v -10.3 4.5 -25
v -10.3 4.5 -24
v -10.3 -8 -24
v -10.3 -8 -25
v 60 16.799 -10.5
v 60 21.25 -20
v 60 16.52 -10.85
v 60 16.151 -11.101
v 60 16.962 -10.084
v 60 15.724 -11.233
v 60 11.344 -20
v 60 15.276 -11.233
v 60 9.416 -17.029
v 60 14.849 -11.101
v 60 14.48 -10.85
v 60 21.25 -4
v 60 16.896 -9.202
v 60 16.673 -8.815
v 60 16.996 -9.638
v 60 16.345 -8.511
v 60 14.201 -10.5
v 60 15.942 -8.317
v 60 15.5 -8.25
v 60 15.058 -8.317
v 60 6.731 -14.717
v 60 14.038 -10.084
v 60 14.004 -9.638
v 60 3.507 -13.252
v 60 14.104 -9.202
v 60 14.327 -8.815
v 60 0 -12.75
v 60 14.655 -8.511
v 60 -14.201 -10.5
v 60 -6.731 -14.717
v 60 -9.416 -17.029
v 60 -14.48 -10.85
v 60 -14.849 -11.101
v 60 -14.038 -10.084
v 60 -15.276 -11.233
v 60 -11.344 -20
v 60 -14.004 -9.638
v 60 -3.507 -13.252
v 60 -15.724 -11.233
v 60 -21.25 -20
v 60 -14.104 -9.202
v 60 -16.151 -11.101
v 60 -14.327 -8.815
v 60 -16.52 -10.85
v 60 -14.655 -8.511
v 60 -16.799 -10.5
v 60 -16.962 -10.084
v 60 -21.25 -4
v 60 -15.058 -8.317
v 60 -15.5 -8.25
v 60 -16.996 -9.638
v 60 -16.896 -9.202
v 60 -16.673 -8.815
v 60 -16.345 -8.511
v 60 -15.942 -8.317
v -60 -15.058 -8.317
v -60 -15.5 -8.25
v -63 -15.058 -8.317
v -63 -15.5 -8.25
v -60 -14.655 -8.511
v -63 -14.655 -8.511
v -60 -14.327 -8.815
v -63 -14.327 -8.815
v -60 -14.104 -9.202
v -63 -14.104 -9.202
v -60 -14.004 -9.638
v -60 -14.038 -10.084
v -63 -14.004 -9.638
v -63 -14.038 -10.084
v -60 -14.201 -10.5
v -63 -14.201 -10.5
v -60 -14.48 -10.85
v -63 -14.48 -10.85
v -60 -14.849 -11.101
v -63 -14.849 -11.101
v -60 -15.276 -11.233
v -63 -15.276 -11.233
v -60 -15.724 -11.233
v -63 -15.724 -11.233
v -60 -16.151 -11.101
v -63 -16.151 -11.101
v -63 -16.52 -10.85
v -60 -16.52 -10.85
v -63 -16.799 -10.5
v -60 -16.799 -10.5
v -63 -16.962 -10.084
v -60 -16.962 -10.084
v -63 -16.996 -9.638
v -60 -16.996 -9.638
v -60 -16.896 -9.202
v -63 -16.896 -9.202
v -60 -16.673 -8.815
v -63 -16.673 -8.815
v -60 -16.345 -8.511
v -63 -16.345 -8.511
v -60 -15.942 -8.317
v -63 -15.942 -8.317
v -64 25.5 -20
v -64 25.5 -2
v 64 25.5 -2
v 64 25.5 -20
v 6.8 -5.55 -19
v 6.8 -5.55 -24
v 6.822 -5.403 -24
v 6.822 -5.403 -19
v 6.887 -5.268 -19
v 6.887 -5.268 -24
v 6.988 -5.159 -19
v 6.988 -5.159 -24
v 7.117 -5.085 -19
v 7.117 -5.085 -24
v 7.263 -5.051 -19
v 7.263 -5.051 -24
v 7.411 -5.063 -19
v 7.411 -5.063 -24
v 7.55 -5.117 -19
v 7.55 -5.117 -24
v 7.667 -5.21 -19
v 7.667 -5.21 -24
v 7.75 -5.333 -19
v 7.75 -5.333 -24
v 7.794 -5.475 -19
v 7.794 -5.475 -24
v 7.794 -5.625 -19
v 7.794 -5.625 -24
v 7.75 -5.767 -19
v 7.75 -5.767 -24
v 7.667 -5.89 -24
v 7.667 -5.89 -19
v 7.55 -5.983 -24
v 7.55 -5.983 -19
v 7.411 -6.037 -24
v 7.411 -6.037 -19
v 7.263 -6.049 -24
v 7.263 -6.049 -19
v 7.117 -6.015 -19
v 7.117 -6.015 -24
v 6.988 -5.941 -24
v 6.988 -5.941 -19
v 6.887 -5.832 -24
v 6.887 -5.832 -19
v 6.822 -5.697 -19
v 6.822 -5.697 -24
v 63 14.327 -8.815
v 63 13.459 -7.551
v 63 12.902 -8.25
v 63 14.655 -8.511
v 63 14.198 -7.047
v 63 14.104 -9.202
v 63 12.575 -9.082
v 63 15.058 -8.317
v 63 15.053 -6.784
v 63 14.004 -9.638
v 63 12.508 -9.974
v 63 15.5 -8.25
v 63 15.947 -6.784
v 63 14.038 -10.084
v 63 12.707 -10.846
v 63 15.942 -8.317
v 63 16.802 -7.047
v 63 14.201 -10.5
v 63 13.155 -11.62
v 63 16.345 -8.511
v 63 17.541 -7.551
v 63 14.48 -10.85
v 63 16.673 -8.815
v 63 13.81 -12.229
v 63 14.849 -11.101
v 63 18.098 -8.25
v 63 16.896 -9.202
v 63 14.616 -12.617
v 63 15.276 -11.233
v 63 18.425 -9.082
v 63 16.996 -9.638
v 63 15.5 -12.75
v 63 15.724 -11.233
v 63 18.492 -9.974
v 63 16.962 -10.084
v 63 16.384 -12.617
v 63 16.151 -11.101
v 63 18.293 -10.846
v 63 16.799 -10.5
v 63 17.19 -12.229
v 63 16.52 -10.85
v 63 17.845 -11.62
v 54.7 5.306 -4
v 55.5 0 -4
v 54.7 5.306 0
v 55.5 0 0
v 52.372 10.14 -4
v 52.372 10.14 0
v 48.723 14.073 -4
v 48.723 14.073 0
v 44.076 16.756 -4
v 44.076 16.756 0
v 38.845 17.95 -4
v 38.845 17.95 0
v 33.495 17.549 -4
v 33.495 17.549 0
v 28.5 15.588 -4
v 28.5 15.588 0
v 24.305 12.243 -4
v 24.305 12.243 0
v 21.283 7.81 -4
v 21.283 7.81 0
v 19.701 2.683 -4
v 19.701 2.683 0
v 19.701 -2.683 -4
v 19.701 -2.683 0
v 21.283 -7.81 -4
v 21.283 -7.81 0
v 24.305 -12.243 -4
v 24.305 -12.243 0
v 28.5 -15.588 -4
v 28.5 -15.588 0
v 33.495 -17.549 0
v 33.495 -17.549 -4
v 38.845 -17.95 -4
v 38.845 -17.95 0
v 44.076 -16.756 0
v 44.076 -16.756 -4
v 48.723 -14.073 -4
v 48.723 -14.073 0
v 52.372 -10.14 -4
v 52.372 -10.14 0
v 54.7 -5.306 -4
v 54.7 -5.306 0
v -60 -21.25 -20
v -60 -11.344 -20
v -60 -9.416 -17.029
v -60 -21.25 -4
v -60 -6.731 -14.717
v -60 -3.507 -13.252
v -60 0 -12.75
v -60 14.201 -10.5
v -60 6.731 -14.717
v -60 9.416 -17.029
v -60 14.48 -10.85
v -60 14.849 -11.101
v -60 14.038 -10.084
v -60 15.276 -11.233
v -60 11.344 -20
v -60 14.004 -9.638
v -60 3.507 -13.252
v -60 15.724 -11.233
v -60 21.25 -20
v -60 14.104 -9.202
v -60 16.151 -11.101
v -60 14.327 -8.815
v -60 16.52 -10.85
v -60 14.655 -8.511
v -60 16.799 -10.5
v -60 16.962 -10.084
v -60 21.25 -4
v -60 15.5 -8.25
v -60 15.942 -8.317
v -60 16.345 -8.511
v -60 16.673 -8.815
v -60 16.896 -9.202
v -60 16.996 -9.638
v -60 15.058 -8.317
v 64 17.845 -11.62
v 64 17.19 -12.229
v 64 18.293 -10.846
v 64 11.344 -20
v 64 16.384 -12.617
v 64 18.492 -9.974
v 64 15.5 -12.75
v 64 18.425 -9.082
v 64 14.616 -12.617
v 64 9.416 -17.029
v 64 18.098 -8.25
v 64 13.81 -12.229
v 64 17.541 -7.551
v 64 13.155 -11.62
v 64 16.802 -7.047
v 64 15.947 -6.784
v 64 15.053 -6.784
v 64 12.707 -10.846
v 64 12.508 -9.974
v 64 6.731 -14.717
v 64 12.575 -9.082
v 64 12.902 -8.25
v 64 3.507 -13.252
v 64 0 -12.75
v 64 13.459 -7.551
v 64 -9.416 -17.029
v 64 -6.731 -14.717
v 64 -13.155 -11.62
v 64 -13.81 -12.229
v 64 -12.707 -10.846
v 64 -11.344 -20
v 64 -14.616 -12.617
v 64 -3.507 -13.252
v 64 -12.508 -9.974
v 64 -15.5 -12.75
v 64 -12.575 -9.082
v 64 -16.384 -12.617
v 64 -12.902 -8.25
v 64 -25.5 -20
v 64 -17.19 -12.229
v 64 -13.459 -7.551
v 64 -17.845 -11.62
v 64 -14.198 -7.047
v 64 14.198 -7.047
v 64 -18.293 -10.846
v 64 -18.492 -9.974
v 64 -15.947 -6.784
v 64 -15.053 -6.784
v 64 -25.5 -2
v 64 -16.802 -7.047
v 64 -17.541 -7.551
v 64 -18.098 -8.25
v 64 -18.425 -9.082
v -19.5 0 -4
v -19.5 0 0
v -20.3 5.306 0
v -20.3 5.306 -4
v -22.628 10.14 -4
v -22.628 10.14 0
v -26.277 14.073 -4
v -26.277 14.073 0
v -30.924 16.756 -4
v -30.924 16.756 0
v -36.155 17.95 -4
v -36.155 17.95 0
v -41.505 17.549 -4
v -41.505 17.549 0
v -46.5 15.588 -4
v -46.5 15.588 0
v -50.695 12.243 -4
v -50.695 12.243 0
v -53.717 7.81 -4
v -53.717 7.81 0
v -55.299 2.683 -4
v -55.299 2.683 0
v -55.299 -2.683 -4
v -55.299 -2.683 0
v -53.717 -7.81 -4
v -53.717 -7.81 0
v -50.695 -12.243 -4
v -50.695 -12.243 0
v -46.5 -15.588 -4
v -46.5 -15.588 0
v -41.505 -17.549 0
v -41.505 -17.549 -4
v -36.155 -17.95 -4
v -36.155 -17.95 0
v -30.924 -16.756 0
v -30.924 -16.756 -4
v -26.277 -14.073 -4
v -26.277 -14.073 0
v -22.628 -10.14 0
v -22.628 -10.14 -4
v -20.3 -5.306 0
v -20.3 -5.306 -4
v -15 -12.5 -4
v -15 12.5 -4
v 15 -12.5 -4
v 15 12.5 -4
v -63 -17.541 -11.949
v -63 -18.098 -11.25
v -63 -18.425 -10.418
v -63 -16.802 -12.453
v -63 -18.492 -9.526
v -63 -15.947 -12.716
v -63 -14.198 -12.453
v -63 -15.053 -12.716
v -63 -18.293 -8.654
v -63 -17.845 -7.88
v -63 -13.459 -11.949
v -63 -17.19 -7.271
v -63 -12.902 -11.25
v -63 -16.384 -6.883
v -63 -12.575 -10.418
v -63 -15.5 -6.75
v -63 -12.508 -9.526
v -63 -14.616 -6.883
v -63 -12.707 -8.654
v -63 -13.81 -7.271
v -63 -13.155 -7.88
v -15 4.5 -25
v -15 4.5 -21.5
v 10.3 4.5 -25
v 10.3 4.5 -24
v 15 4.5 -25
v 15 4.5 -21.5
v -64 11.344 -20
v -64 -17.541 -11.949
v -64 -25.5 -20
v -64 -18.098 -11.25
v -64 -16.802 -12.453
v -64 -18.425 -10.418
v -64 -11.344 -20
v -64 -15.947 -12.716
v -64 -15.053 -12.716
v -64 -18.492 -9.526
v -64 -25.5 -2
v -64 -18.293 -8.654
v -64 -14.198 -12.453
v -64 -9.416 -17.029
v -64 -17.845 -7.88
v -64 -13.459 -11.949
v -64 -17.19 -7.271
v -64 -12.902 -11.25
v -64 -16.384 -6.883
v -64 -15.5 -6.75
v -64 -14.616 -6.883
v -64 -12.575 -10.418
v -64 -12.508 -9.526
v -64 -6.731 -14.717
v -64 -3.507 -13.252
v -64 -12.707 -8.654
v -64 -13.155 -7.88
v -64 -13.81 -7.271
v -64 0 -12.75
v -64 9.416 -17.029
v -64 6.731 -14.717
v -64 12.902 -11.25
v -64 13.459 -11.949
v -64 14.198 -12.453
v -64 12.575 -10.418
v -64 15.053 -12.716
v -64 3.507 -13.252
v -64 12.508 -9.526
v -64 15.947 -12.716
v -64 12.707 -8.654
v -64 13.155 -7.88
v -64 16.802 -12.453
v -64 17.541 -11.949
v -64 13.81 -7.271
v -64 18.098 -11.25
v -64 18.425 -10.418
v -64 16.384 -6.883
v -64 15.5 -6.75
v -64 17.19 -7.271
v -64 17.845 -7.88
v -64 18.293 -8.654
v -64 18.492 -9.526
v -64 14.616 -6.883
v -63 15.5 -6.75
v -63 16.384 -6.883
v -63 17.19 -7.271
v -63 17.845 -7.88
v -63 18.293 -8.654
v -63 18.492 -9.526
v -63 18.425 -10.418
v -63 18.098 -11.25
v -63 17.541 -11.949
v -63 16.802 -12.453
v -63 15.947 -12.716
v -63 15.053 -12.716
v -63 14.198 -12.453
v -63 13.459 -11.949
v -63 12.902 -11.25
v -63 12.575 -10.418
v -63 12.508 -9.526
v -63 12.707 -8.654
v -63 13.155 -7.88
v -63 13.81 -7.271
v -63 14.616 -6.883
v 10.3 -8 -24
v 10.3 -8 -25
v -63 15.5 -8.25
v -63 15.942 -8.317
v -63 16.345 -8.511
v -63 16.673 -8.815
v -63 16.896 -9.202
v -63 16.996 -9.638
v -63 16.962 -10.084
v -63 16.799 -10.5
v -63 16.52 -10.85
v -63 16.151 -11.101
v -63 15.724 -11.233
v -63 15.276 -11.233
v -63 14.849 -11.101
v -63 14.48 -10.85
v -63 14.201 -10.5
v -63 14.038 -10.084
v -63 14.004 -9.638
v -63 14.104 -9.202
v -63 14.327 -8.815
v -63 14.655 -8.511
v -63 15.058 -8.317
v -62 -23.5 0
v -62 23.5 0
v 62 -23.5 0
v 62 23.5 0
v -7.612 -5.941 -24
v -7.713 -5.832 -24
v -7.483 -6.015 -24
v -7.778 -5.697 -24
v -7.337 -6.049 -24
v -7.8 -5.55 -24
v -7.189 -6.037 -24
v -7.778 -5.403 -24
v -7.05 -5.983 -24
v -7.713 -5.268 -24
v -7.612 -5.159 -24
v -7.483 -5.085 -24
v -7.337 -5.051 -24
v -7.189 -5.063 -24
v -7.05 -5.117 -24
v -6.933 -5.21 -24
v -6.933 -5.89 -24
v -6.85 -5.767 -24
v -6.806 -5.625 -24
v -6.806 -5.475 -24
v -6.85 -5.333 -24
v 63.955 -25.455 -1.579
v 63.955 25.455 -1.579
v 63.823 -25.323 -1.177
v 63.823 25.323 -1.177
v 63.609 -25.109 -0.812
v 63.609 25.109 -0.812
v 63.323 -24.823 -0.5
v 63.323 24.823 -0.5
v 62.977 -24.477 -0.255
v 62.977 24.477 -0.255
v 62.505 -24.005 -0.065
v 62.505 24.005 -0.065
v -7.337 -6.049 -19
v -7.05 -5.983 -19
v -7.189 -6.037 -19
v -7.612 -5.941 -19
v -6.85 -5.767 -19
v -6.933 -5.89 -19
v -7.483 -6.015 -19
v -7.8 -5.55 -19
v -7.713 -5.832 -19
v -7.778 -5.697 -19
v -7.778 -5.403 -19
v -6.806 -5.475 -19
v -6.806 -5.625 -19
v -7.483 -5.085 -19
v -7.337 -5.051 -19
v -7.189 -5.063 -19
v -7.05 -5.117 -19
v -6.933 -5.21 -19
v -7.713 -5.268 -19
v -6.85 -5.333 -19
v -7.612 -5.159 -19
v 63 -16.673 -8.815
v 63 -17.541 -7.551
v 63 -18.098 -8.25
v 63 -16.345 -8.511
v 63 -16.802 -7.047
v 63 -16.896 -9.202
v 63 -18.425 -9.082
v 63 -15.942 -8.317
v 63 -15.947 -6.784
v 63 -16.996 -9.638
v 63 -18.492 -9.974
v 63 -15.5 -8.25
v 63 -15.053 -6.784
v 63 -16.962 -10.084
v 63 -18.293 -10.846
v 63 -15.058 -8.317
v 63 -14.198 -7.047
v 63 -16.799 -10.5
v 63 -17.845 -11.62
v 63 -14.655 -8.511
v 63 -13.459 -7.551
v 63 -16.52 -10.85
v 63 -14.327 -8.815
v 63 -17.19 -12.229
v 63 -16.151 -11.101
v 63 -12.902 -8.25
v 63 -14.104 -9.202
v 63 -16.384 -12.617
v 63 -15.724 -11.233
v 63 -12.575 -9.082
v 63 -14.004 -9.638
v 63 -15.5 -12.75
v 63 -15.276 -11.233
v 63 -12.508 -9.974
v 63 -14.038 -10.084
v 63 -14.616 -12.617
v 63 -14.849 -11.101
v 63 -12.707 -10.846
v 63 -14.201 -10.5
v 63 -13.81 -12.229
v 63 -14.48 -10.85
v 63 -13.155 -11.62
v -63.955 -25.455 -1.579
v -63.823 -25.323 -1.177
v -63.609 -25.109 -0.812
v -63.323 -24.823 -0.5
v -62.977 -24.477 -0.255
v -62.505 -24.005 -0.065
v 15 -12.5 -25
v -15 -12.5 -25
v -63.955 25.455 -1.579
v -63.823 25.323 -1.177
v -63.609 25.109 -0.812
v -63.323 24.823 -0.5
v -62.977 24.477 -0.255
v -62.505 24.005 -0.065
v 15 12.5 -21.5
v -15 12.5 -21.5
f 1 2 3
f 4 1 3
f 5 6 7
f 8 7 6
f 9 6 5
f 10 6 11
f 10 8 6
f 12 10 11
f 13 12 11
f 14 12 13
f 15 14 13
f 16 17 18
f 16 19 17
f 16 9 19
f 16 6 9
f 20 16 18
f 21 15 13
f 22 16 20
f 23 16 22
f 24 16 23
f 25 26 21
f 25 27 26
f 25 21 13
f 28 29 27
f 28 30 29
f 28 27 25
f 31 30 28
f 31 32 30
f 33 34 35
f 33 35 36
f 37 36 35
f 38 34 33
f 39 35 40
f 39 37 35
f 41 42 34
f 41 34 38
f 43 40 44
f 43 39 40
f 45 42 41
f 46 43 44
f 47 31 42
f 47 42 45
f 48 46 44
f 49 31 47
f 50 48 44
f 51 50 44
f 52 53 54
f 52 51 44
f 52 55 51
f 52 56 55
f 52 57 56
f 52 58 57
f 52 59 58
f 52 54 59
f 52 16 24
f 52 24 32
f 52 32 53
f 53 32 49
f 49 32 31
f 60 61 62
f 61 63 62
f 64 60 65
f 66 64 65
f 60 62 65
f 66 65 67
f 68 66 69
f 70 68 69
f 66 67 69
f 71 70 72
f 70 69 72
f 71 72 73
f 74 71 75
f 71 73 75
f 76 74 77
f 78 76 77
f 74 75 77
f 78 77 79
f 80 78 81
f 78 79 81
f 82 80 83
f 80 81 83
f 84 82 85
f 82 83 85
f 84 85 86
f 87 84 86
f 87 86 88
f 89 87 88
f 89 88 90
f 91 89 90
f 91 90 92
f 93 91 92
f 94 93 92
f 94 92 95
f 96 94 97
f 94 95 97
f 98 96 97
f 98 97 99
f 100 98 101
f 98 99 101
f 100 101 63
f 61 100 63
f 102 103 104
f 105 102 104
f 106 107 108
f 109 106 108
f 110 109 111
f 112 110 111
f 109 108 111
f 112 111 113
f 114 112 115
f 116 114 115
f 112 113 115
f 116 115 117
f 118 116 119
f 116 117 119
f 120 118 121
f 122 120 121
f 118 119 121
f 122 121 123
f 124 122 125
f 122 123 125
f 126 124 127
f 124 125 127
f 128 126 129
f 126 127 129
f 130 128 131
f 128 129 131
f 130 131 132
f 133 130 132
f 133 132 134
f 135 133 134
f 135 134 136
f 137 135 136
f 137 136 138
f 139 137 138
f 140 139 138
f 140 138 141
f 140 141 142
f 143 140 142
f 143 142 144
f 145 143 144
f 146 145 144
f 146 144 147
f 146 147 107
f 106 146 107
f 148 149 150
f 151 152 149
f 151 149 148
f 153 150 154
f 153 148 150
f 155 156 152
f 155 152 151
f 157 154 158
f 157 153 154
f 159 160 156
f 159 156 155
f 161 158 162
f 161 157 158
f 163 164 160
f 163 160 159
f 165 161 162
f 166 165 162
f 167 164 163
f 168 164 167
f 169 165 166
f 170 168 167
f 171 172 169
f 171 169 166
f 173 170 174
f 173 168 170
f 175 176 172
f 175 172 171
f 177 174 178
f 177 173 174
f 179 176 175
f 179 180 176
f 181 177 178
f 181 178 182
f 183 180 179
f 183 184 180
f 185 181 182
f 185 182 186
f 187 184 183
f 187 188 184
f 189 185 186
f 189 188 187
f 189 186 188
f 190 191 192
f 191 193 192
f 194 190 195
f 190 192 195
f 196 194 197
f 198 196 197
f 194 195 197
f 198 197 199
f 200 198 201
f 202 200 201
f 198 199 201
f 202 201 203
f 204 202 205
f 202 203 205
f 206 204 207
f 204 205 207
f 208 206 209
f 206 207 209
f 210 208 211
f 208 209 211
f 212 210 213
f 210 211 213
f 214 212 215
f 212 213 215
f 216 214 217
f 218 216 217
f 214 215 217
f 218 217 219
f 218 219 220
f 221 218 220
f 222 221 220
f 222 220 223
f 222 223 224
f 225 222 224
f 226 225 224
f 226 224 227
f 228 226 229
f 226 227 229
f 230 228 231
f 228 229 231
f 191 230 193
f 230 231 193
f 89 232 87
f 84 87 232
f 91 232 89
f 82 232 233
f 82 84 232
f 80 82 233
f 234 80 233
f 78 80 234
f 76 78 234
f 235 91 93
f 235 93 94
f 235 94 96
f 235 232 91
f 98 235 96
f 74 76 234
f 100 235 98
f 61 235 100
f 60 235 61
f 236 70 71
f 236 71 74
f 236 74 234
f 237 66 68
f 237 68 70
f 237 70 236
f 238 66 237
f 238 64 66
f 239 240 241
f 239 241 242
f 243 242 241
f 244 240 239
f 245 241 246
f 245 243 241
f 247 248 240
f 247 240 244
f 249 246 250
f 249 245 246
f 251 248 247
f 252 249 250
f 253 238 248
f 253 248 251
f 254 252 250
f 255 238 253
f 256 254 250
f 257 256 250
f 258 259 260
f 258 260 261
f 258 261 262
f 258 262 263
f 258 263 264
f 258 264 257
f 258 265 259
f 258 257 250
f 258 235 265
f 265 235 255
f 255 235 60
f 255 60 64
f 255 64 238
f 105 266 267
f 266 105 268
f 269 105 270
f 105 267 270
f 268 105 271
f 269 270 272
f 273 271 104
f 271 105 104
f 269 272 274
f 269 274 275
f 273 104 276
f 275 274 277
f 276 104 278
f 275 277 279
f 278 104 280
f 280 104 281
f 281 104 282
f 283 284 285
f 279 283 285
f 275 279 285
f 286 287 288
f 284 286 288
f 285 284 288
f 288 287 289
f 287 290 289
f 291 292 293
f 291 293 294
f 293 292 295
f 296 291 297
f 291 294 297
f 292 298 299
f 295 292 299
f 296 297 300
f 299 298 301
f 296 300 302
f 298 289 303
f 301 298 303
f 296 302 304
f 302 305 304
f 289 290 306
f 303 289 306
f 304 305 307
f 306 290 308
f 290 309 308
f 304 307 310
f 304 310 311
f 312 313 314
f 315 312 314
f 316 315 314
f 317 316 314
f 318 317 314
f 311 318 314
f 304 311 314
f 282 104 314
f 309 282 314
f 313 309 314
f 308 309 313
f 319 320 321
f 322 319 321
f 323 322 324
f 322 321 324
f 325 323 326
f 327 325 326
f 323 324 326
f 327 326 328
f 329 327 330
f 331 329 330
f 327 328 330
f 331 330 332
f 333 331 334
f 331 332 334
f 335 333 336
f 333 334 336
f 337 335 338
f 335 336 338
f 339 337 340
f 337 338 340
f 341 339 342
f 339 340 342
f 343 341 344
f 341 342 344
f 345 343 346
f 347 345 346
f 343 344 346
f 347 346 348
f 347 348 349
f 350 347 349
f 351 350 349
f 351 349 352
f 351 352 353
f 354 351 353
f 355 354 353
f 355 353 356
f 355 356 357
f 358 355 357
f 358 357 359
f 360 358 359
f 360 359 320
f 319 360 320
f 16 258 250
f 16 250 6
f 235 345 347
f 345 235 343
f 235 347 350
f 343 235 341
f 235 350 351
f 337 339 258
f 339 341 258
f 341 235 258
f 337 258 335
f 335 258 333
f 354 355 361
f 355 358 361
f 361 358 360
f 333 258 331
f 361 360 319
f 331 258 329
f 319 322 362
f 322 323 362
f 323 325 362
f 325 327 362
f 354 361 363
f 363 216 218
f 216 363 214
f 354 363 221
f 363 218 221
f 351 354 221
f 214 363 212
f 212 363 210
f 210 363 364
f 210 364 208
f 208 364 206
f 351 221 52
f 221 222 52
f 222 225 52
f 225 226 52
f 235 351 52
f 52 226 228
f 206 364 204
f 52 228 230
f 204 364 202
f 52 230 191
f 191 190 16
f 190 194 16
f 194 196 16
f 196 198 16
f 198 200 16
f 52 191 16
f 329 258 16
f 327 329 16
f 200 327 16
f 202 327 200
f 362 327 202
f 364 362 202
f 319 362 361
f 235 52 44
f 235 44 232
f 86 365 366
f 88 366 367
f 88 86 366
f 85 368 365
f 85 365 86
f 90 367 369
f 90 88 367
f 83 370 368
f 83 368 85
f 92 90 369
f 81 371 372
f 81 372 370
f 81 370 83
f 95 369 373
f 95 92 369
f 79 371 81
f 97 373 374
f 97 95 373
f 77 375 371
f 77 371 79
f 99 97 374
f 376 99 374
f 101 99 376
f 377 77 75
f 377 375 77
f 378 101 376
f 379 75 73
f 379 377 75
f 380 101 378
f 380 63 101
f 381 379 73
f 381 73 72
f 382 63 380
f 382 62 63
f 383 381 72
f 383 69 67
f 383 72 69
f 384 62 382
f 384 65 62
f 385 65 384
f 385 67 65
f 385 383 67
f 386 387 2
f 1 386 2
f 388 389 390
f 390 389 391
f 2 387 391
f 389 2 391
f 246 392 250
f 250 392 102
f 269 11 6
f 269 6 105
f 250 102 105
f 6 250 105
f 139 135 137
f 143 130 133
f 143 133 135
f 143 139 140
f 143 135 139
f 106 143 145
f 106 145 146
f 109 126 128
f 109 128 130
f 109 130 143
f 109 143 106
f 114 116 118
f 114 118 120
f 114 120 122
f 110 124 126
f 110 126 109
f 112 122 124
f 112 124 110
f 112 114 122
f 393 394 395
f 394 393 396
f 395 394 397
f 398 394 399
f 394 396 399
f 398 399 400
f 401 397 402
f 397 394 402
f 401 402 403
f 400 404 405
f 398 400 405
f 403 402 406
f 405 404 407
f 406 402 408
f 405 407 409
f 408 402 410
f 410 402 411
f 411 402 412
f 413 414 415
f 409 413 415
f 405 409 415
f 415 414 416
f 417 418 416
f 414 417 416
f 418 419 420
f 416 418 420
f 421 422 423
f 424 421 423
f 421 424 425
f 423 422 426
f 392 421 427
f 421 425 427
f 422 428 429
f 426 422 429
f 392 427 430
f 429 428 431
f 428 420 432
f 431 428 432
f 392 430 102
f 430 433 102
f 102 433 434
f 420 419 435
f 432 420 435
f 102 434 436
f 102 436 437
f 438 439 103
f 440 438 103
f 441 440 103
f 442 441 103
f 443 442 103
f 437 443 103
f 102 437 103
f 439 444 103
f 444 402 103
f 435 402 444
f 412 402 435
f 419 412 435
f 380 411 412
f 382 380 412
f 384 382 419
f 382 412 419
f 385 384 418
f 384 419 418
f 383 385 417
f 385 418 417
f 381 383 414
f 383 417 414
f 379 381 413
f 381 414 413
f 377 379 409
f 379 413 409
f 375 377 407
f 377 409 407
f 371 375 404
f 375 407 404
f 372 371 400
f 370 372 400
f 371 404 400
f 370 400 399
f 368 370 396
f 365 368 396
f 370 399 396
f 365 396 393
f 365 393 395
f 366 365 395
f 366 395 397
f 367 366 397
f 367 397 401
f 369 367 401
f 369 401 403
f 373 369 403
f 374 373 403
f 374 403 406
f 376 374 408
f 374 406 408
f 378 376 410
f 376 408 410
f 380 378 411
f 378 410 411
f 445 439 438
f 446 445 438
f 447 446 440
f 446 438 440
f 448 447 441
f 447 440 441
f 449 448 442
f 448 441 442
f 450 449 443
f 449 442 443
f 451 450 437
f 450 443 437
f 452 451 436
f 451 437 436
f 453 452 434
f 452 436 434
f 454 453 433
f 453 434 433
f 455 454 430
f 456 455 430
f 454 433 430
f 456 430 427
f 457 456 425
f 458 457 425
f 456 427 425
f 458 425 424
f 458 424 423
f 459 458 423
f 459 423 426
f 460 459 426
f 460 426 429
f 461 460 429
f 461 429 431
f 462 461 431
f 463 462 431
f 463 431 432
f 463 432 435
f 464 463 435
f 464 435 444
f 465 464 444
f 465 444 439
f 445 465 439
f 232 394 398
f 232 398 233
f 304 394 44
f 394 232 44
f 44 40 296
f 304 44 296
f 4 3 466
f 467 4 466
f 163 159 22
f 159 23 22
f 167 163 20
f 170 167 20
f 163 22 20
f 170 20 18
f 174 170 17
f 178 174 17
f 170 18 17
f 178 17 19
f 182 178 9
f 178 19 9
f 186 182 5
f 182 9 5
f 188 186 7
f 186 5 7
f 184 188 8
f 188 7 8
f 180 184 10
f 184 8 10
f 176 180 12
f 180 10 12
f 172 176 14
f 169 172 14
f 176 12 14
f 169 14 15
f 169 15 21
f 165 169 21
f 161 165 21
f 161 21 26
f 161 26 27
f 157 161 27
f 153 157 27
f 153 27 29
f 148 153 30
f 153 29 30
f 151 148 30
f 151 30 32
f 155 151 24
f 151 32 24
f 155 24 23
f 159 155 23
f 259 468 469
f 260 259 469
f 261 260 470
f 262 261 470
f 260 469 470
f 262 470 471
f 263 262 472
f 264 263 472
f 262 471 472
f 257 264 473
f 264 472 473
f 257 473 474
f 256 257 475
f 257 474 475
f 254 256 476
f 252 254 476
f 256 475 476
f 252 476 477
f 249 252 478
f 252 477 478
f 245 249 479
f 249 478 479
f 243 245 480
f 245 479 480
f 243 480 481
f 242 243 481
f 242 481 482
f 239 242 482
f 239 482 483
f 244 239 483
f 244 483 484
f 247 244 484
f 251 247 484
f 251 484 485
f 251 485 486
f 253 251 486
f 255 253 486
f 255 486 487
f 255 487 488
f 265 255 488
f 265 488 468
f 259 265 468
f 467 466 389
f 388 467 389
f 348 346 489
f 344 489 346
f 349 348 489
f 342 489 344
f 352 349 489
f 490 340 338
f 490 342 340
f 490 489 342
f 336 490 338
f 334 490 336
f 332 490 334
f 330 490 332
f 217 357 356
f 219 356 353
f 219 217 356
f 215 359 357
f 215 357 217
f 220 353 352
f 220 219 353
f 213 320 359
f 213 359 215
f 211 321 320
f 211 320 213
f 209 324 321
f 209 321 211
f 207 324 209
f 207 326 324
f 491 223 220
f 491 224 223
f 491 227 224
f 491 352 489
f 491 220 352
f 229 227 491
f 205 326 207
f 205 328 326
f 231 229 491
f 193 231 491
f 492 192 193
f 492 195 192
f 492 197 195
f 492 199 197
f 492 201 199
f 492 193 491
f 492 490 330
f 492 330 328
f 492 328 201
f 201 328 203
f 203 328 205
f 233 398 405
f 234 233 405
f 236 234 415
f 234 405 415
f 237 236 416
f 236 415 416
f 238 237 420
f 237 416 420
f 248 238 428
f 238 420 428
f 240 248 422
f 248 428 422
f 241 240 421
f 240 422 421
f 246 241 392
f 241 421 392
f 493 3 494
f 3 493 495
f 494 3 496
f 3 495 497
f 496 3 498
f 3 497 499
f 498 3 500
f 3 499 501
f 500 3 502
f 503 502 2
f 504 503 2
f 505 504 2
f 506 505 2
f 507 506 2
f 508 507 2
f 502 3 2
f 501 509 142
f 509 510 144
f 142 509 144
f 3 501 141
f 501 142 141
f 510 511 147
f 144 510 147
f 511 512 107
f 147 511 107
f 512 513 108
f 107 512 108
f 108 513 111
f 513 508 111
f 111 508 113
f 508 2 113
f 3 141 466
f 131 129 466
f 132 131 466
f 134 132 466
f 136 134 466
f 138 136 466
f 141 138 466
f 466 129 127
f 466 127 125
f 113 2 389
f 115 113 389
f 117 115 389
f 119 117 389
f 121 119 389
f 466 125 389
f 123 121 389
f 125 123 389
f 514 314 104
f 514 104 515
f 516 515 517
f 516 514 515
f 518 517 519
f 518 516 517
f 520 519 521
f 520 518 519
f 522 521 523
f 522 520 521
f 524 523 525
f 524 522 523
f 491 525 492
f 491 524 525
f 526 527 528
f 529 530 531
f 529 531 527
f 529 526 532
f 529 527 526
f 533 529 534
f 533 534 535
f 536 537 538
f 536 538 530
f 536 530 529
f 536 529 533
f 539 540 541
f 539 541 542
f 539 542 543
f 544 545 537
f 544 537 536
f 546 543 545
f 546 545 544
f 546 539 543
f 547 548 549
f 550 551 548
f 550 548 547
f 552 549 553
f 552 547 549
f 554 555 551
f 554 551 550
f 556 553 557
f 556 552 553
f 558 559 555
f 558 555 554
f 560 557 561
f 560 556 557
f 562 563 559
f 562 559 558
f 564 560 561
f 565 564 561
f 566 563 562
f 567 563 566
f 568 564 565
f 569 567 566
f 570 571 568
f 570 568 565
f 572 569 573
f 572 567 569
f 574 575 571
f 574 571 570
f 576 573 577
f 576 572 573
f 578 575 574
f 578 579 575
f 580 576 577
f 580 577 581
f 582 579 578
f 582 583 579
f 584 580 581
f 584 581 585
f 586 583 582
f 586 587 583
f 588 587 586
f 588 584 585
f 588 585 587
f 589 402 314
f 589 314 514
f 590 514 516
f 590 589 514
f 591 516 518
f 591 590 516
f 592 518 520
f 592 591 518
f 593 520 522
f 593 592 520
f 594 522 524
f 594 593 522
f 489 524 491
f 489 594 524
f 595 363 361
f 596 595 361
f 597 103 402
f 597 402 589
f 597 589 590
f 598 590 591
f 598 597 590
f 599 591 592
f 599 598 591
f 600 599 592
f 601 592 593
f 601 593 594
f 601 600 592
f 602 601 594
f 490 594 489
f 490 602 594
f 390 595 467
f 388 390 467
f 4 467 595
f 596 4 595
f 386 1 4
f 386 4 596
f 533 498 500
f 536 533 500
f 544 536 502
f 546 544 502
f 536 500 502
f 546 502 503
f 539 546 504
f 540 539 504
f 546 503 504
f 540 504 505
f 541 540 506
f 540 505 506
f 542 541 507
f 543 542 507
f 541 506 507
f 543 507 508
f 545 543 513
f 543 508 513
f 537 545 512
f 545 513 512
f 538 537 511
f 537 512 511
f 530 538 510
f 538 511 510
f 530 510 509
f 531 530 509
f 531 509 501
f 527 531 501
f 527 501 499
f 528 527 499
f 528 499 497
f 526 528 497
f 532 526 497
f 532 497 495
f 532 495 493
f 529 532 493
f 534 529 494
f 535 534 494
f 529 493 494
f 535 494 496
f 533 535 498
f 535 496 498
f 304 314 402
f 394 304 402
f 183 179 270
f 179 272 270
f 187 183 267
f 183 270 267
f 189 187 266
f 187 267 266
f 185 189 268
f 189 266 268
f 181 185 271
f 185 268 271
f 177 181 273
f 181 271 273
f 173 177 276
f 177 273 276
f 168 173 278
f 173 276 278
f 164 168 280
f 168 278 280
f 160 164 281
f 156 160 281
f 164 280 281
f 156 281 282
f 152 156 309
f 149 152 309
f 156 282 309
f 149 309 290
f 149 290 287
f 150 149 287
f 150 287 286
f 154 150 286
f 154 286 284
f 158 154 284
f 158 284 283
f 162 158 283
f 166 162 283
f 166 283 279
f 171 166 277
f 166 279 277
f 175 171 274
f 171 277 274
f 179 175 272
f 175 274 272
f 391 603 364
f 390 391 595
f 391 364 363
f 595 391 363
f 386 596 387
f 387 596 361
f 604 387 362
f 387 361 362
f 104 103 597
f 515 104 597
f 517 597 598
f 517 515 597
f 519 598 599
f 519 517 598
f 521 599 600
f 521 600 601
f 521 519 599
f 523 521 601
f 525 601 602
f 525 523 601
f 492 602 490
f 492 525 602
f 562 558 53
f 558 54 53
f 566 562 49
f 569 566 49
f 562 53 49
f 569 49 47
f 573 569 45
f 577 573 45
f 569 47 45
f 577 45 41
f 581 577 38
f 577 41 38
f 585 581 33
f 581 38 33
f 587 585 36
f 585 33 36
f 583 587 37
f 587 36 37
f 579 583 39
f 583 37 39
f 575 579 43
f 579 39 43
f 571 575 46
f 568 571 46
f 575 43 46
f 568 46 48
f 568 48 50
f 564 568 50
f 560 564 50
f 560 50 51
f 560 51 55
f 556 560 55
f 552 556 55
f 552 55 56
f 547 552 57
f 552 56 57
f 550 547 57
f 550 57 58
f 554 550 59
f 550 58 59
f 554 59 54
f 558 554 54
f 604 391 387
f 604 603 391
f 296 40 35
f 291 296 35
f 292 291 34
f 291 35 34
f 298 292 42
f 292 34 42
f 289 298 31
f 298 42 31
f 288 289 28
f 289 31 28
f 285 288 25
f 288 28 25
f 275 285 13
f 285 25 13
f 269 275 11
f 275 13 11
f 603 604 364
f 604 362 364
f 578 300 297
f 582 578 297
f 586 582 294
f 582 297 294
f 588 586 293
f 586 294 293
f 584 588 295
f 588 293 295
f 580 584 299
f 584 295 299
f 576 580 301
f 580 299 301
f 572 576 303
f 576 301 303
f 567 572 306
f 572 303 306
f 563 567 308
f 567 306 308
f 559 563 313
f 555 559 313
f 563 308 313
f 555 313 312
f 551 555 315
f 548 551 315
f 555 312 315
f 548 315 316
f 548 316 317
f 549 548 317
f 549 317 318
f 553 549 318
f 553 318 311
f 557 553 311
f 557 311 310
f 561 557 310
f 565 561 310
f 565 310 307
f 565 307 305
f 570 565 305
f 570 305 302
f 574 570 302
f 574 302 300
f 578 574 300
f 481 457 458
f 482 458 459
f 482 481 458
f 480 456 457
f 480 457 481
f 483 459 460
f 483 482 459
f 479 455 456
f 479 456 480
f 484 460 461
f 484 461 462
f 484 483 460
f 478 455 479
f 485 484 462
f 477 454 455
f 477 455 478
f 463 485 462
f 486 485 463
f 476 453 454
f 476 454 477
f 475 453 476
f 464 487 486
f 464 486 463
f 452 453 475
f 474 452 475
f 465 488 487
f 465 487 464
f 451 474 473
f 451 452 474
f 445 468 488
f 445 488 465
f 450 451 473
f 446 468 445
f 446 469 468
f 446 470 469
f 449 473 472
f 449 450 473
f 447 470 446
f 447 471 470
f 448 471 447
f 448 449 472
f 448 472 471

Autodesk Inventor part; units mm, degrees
ref_plane "YZ Plane" through (0, 0, 0) normal (1, 0, 0) x (0, 1, 0)
ref_plane "XZ Plane" through (0, 0, 0) normal (0, 1, 0) x (-1, 0, 0)
ref_plane "XY Plane" through (0, 0, 0) normal (0, 0, 1) x (1, 0, 0)
sketch "Sketch2" plane through (0, 0, 0) normal (0, 0, 1) x (1, 0, 0)
  line L0 (-60, 21.25) -> (60, 21.25)
  line L1 (60, 21.25) -> (60, -21.25)
  line L2 (60, -21.25) -> (-60, -21.25)
  line L3 (-60, -21.25) -> (-60, 21.25)
  line L4 (-60, 21.25) -> (60, -21.25) construction
  line L5 (60, 21.25) -> (-60, -21.25) construction
  line L6 (-64, 25.5) -> (64, 25.5)
  line L7 (64, 25.5) -> (64, -25.5)
  line L8 (64, -25.5) -> (-64, -25.5)
  line L9 (-64, -25.5) -> (-64, 25.5)
  line L10 (-64, 25.5) -> (64, -25.5) construction
  line L11 (64, 25.5) -> (-64, -25.5) construction
  line L12 (-15, 12.5) -> (15, 12.5)
  line L13 (15, 12.5) -> (15, -12.5)
  line L14 (15, -12.5) -> (-15, -12.5)
  line L15 (-15, -12.5) -> (-15, 12.5)
  line L16 (-15, 12.5) -> (15, -12.5) construction
  line L17 (15, 12.5) -> (-15, -12.5) construction
  circle A0 centre (37.5, 0) radius 18
  circle A1 centre (-37.5, 0) radius 18
  point P0 (0, 0)
  point P1 (0, 0)
  dimension "d0" = 120
  dimension "d1" = 42.5
  dimension "d2" = 60
  dimension "d3" = 21.25
  dimension "d4" = 128
  dimension "d5" = 51
  dimension "d28" = 30
  dimension "d29" = 25
  dimension "d32" = 45
  dimension "d33" = 36
  dimension "d34" = 22.5
  dimension "d35" = 45
  dimension "d36" = 36
  dimension "d37" = 22.5
  dimension "d38" = 21.25
  dimension "d39" = 21.25
extrude "Extrusion1" add sketch "Sketch2" against normal blind 4 contours L0 L1 L2 L3 | L12 L13 L14 L15 | A0 | A1
extrude "Extrusion2" add sketch "Sketch2" against normal blind 20 contours L6 L7 L8 L9
fillet "Fillet1" radius 2 4 edges at (-64, 0, 0) (0, 25.5, 0) (64, 0, 0) (0, -25.5, 0)
sketch "Sketch3" plane through (-64, -25.5, -20) normal (-1, 0, 0) x (0, 0, 1)
  line L0 (16, 4.25) -> (16, 46.75) projected
  line L1 (16, 4.25) -> (-26.5, 4.25)
  line L2 (-26.5, 4.25) -> (-26.5, 46.75)
  line L3 (-26.5, 46.75) -> (16, 46.75)
  line L4 (16, 46.75) -> (16, 4.25)
  circle A0 centre (-5.25, 25.5) radius 11 construction
  circle A1 centre (-5.25, 25.5) radius 12.5
  circle A2 centre (10.25, 10) radius 1.5
  circle A3 centre (10.25, 41) radius 1.5
  point P0 (20, 25.5)
  dimension "d11" = 42.5
  dimension "d12" = 22
  dimension "d13" = 25
  dimension "d16" = 3
  dimension "d17" = 3
  dimension "d19" = 15.5
  dimension "d20" = 21.25
  dimension "d21" = 42.5
  dimension "d22" = 21.25
  dimension "d23" = 15.5
  dimension "d24" = 15.5
  dimension "d25" = 15.5
extrude "Extrusion3" cut sketch "Sketch3" against normal blind 150 contours A1
sketch "Sketch5" plane through (-64, 25.5, -20) normal (0, 1, 0) x (1, 0, 0)
  point P0 (64, -20)
extrude "Extrusion4" cut sketch "Sketch3" against normal blind 150 contours A2 | A3
extrude "Extrusion5" add sketch "Sketch2" against normal blind 24 contours L12 L13 L14 L15
extrude "Extrusion6" cut sketch "Sketch2" against normal blind 24 contours A0 | A1
sketch "Sketch6" plane through (0, 0, -24) normal (0, 0, -1) x (-1, 0, 0)
  line L0 (-10.3, 8) -> (10.3, 8)
  line L1 (10.3, 8) -> (10.3, -8)
  line L2 (10.3, -8) -> (-10.3, -8)
  line L3 (-10.3, -8) -> (-10.3, 8)
  line L4 (-10.3, 8) -> (10.3, -8) construction
  line L5 (10.3, 8) -> (-10.3, -8) construction
  line L6 (-15, -12.5) -> (-15, 12.5) projected
  line L7 (15, -12.5) -> (-15, -12.5) projected
  line L8 (-15, 12.5) -> (15, 12.5)
  line L9 (15, 12.5) -> (15, -12.5)
  line L10 (15, -12.5) -> (-15, -12.5)
  line L11 (-15, -12.5) -> (-15, 12.5)
  line L12 (15, 12.5) -> (15, -12.5) projected
  line L13 (-15, 12.5) -> (15, 12.5)
  line L14 (15, 12.5) -> (15, 4.5)
  line L15 (15, 4.5) -> (-15, 4.5)
  line L16 (-15, 4.5) -> (-15, 12.5)
  point P0 (0, 0)
  dimension "d42" = 20.6
  dimension "d43" = 16
  dimension "d46" = 12.5
extrude "Extrusion7" add sketch "Sketch6" along normal blind 1 contours L3 L15 L6 L8 L9 L1 L0 | L3 L2 L1 L15 L9 L7 L6
extrude "Extrusion8" cut sketch "Sketch6" along normal mid plane 5 contours L3 L15 L6 L8 L9 L1 L0 | L0 L1 L15 L3
sketch "Sketch7" plane through (0, 0, -24) normal (0, 0, -1) x (-1, 0, 0)
  line L0 (10.3, -8) -> (-10.3, -8) projected
  line L1 (10.3, 4.5) -> (-10.3, 4.5) projected
  line L2 (10.3, -8) -> (-10.3, -8)
  line L3 (-10.3, -8) -> (-10.3, 4.5)
  line L4 (-10.3, 4.5) -> (10.3, 4.5)
  line L5 (10.3, 4.5) -> (10.3, -8)
  circle A0 centre (7.3, -5.55) radius 0.5
  circle A1 centre (-7.3, -5.55) radius 0.5
  point P0 (0, 0)
  dimension "d49" = 1
  dimension "d50" = 1
  dimension "d51" = 3
  dimension "d52" = 3
  dimension "d53" = 2.45
  dimension "d54" = 2.45
  dimension "d55" = 14.6
extrude "Extrusion9" cut sketch "Sketch7" against normal blind 5 contours A0 | A1
sketch "Sketch8" plane through (-64, -25.5, -2) normal (-1, 0, 0) x (0, 0, 1)
  circle A0 centre (-7.75, 10) radius 1.5 projected
  circle A1 centre (-7.75, 10) radius 3
  circle A2 centre (-7.75, 41) radius 1.5 projected
  circle A3 centre (-7.75, 41) radius 3
  point P0 (2, 25.5)
  dimension "d58" = 6
  dimension "d59" = 6
extrude "Extrusion10" cut sketch "Sketch8" against normal blind 1
sketch "Sketch9" plane through (64, -25.5, -2) normal (1, 0, 0) x (0, 0, -1)
  circle A0 centre (7.75, 41) radius 1.5 projected
  circle A1 centre (7.75, 41) radius 3
  circle A2 centre (7.75, 10) radius 1.5 projected
  circle A3 centre (7.75, 10) radius 3
  point P0 (-2, 25.5)
  dimension "d62" = 6
  dimension "d63" = 6
extrude "Extrusion11" cut sketch "Sketch9" against normal blind 1
equation "\"d2\" = 0.5 * d0"
equation "\"d3\" = 0.5 * d1"
equation "\"d34\" = 0.5 * d32"
equation "\"d37\" = 0.5 * d35"
equation "\"d38\" = 0.5 * d1"
equation "\"d39\" = 0.5 * d1"
equation "\"d20\" = 0.5 * d21"
equation "\"d21\" = d11"
equation "\"d22\" = 0.5 * d11"
equation "\"d52\" = d51"
equation "\"d54\" = d53"
properties part number "Baseplate"
